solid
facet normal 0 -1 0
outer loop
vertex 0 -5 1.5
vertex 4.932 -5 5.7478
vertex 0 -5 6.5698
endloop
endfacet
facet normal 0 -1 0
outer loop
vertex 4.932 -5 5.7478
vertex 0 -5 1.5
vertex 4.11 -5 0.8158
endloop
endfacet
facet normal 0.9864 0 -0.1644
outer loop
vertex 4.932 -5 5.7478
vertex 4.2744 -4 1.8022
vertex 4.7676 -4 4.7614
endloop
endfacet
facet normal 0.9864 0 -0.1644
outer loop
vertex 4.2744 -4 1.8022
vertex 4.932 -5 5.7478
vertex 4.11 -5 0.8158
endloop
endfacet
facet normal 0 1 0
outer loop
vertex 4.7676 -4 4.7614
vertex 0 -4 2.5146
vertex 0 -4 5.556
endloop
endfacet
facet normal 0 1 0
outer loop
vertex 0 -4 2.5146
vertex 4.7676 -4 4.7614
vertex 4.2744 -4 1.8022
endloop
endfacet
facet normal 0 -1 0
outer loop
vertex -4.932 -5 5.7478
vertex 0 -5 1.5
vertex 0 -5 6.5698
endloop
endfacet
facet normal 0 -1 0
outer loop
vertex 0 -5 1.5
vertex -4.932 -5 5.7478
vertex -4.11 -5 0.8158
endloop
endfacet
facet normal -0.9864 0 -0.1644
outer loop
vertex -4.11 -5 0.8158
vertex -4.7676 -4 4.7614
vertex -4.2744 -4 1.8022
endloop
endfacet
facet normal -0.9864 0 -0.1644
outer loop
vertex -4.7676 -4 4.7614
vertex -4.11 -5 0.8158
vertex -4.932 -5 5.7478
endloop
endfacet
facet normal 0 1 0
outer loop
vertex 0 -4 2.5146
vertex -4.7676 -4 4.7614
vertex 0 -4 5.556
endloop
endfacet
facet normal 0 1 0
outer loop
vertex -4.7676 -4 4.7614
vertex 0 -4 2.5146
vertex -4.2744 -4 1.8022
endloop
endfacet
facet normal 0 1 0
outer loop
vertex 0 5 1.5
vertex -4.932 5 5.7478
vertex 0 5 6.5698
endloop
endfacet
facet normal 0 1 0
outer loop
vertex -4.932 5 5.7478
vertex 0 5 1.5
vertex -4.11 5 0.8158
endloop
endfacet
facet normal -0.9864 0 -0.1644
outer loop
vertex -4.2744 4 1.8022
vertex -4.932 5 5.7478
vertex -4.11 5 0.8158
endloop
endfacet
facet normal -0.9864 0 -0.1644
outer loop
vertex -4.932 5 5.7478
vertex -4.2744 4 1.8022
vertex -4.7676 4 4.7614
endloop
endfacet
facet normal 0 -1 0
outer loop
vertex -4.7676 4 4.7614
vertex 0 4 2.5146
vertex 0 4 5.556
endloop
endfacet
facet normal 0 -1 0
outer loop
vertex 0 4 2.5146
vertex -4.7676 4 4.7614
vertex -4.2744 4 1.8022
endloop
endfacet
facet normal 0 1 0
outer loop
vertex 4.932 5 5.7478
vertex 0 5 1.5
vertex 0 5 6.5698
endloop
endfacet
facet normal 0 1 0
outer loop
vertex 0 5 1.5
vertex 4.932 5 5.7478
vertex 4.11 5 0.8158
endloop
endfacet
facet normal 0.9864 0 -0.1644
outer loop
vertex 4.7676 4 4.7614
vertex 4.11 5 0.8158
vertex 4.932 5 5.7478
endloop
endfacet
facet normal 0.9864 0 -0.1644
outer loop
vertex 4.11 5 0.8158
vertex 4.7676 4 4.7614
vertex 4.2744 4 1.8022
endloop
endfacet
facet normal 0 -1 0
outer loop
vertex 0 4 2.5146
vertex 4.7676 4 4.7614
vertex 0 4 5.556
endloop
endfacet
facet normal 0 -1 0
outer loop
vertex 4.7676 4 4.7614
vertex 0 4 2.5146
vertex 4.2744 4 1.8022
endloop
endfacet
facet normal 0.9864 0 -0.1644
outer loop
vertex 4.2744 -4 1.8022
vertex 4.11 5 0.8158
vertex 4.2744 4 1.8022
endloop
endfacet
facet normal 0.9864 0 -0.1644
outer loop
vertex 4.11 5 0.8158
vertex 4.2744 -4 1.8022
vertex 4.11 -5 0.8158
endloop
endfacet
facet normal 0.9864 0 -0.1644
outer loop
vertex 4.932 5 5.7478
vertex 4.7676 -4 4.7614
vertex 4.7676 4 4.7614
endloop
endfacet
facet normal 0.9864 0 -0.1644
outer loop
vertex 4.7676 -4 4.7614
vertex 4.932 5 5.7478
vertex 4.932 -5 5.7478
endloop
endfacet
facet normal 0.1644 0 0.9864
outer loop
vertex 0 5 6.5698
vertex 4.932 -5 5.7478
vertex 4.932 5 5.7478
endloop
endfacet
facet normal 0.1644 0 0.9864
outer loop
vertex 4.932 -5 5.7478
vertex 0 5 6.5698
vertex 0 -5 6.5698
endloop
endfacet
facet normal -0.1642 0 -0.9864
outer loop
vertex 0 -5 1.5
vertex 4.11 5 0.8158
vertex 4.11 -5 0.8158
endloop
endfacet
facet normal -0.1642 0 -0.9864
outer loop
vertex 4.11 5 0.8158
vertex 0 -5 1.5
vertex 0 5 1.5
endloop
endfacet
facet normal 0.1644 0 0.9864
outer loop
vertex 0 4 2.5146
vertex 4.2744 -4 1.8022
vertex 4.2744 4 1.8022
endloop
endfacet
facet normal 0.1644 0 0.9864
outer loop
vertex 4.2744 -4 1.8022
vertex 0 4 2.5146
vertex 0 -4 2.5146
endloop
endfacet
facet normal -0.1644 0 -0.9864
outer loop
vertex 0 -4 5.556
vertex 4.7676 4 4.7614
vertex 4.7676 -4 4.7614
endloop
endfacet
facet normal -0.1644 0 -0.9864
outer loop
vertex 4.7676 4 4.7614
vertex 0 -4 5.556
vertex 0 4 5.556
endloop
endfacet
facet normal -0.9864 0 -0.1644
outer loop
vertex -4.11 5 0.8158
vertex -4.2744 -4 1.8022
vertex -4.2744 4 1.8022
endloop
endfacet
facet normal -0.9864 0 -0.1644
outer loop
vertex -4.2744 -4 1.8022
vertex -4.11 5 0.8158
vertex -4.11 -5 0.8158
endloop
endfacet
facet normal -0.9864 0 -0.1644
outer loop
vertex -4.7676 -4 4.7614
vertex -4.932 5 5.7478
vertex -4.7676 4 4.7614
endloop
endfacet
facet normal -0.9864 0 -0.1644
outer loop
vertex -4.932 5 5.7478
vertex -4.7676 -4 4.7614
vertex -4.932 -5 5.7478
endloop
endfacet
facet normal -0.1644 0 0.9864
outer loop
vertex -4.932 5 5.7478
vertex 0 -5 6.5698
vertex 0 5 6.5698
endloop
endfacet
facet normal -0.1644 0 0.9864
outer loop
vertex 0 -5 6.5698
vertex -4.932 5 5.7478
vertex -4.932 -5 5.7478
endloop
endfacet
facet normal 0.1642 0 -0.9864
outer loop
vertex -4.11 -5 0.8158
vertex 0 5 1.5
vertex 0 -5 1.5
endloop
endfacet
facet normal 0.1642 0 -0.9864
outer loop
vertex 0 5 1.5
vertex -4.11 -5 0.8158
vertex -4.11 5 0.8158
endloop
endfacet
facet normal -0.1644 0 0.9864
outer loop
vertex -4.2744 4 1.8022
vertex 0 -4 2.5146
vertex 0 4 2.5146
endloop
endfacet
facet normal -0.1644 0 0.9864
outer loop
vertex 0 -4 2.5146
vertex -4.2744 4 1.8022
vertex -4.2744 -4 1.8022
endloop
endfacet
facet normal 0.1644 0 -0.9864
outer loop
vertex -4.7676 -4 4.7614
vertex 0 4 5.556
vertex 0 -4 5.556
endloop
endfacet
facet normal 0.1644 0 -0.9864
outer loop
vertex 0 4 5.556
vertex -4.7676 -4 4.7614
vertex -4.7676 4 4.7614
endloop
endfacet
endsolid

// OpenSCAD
// file: s/u7035s01.scad
use <../../lib.scad>
function ldraw_lib__s__u7035s01() = [
// 0 ~Modulex Angled Brick 9 2 x 1 Double - Side
// 0 Name: s\u7035s01.dat
// 0 Author: Magnus Forsberg [MagFors]
// 0 !LDRAW_ORG Subpart UPDATE 2025-09
// 0 !LICENSE Licensed under CC BY 4.0 : see CAreadme.txt
// 
// 0 BFC CERTIFY CCW
  [0,"BFC","CERTIFY"],
  [0,"BFC","CCW"],
// 
// 0 !HISTORY 2025-09-29 [OrionP] Official Update 2025-09
// 
// 4 16 0 -16.4245 0 0 -3.75 0 10.274942 -2.039593 0 12.329925 -14.369517 0
  [4,16,0,-16.4245,0,0,-3.75,0,10.274942,-2.039593,0,12.329925,-14.369517,0],
// 4 16 10.274942 -2.039593 0 10.685939 -4.505578 2.5 11.918928 -11.903532 2.5 12.329925 -14.369517 0
  [4,16,10.274942,-2.039593,0,10.685939,-4.505578,2.5,11.918928,-11.903532,2.5,12.329925,-14.369517,0],
// 4 16 0 -6.286563 2.5 0 -13.890016 2.5 11.918928 -11.903532 2.5 10.685939 -4.505578 2.5
  [4,16,0,-6.286563,2.5,0,-13.890016,2.5,11.918928,-11.903532,2.5,10.685939,-4.505578,2.5],
// 2 24 10.685939 -4.505578 2.5 11.918928 -11.903532 2.5
  [2,24,10.685939,-4.505578,2.5,11.918928,-11.903532,2.5],
// 2 24 12.329925 -14.369517 0 10.274942 -2.039593 0
  [2,24,12.329925,-14.369517,0,10.274942,-2.039593,0],
// 2 24 10.274942 -2.039593 0 0 -3.75 0
  [2,24,10.274942,-2.039593,0,0,-3.75,0],
// 2 24 0 -6.286563 2.5 10.685939 -4.505578 2.5
  [2,24,0,-6.286563,2.5,10.685939,-4.505578,2.5],
// 2 24 0 -13.890016 2.5 11.918928 -11.903532 2.5
  [2,24,0,-13.890016,2.5,11.918928,-11.903532,2.5],
// 2 24 0 -16.4245 0 12.329925 -14.369517 0
  [2,24,0,-16.4245,0,12.329925,-14.369517,0],
// 4 16 -10.274942 -2.039593 0 0 -3.75 0 0 -16.4245 0 -12.329925 -14.369517 0
  [4,16,-10.274942,-2.039593,0,0,-3.75,0,0,-16.4245,0,-12.329925,-14.369517,0],
// 4 16 -11.918928 -11.903532 2.5 -10.685939 -4.505578 2.5 -10.274942 -2.039593 0 -12.329925 -14.369517 0
  [4,16,-11.918928,-11.903532,2.5,-10.685939,-4.505578,2.5,-10.274942,-2.039593,0,-12.329925,-14.369517,0],
// 4 16 -11.918928 -11.903532 2.5 0 -13.890016 2.5 0 -6.286563 2.5 -10.685939 -4.505578 2.5
  [4,16,-11.918928,-11.903532,2.5,0,-13.890016,2.5,0,-6.286563,2.5,-10.685939,-4.505578,2.5],
// 2 24 -11.918928 -11.903532 2.5 -10.685939 -4.505578 2.5
  [2,24,-11.918928,-11.903532,2.5,-10.685939,-4.505578,2.5],
// 2 24 -10.274942 -2.039593 0 -12.329925 -14.369517 0
  [2,24,-10.274942,-2.039593,0,-12.329925,-14.369517,0],
// 2 24 0 -3.75 0 -10.274942 -2.039593 0
  [2,24,0,-3.75,0,-10.274942,-2.039593,0],
// 2 24 -10.685939 -4.505578 2.5 0 -6.286563 2.5
  [2,24,-10.685939,-4.505578,2.5,0,-6.286563,2.5],
// 2 24 -11.918928 -11.903532 2.5 0 -13.890016 2.5
  [2,24,-11.918928,-11.903532,2.5,0,-13.890016,2.5],
// 2 24 -12.329925 -14.369517 0 0 -16.4245 0
  [2,24,-12.329925,-14.369517,0,0,-16.4245,0],
];
module ldraw_lib__s__u7035s01(step=0, col=false, unit=2/5, alt=false, line=0.2, solid=!$preview)
    makepoly(ldraw_lib__s__u7035s01(), step=step, col=col, unit=unit, alt=alt, line=line, solid=solid);
ldraw_lib__s__u7035s01(line=0.2);
// main file
use <../lib.scad>
use <s/u7035s01.scad>
function ldraw_lib__u7036() = [
// 0 Modulex Brick Angled 9 2 x 2 Double
// 0 Name: u7036.dat
// 0 Author: Magnus Forsberg [MagFors]
// 0 !LDRAW_ORG Part UPDATE 2025-09
// 0 !LICENSE Licensed under CC BY 4.0 : see CAreadme.txt
// 
// 0 !HELP 1 16 25 12.5 0 1 0 0 0 1 0 0 0 1 u7033.dat
// 0 !HELP 1 35 11.302 -8.204 0 0 .986 .164 0 .164 -.986 -1 0 0 u7001.dat
// 
// 0 BFC CERTIFY CCW
  [0,"BFC","CERTIFY"],
  [0,"BFC","CCW"],
// 
// 0 !KEYWORDS 9.4623 degree, Bricklink Mx2406B, Rebrickable 2406B, slope 1:6
// 
// 0 !HISTORY 2025-09-29 [OrionP] Official Update 2025-09
// 
// 1 16 0 0 -12.5 1 0 0 0 1 0 0 0 1 s\u7035s01.dat
  [1,16,0,0,-12.5,1,0,0,0,1,0,0,0,1, ldraw_lib__s__u7035s01()],
// 1 16 0 0 12.5 -1 0 0 0 1 0 0 0 -1 s\u7035s01.dat
  [1,16,0,0,12.5,-1,0,0,0,1,0,0,0,-1, ldraw_lib__s__u7035s01()],
// 
// 2 24 0 -13.890016 10 0 -13.890016 -10
  [2,24,0,-13.890016,10,0,-13.890016,-10],
// 2 24 0 -6.286563 -10 0 -6.286563 10
  [2,24,0,-6.286563,-10,0,-6.286563,10],
// 2 24 0 -16.4245 -12.5 0 -16.4245 12.5
  [2,24,0,-16.4245,-12.5,0,-16.4245,12.5],
// 2 24 0 -3.75 -12.5 0 -3.75 12.5
  [2,24,0,-3.75,-12.5,0,-3.75,12.5],
// 
// 4 16 10.274942 -2.039593 -12.5 10.274942 -2.039593 12.5 10.685939 -4.505578 10 10.685939 -4.505578 -10
  [4,16,10.274942,-2.039593,-12.5,10.274942,-2.039593,12.5,10.685939,-4.505578,10,10.685939,-4.505578,-10],
// 4 16 12.329925 -14.369517 -12.5 11.918928 -11.903532 -10 11.918928 -11.903532 10 12.329925 -14.369517 12.5
  [4,16,12.329925,-14.369517,-12.5,11.918928,-11.903532,-10,11.918928,-11.903532,10,12.329925,-14.369517,12.5],
// 4 16 12.329925 -14.369517 -12.5 12.329925 -14.369517 12.5 0 -16.4245 12.5 0 -16.4245 -12.5
  [4,16,12.329925,-14.369517,-12.5,12.329925,-14.369517,12.5,0,-16.4245,12.5,0,-16.4245,-12.5],
// 4 16 0 -3.75 12.5 10.274942 -2.039593 12.5 10.274942 -2.039593 -12.5 0 -3.75 -12.5
  [4,16,0,-3.75,12.5,10.274942,-2.039593,12.5,10.274942,-2.039593,-12.5,0,-3.75,-12.5],
// 
// 4 16 0 -6.286563 10 0 -6.286563 -10 10.685939 -4.505578 -10 10.685939 -4.505578 10
  [4,16,0,-6.286563,10,0,-6.286563,-10,10.685939,-4.505578,-10,10.685939,-4.505578,10],
// 4 16 0 -13.890016 10 11.918928 -11.903532 10 11.918928 -11.903532 -10 0 -13.890016 -10
  [4,16,0,-13.890016,10,11.918928,-11.903532,10,11.918928,-11.903532,-10,0,-13.890016,-10],
// 
// 2 24 12.329925 -14.369517 -12.5 12.329925 -14.369517 12.5
  [2,24,12.329925,-14.369517,-12.5,12.329925,-14.369517,12.5],
// 2 24 11.918928 -11.903532 -10 11.918928 -11.903532 10
  [2,24,11.918928,-11.903532,-10,11.918928,-11.903532,10],
// 2 24 10.274942 -2.039593 -12.5 10.274942 -2.039593 12.5
  [2,24,10.274942,-2.039593,-12.5,10.274942,-2.039593,12.5],
// 2 24 10.685939 -4.505578 10 10.685939 -4.505578 -10
  [2,24,10.685939,-4.505578,10,10.685939,-4.505578,-10],
// 
// 4 16 -10.685939 -4.505578 10 -10.274942 -2.039593 12.5 -10.274942 -2.039593 -12.5 -10.685939 -4.505578 -10
  [4,16,-10.685939,-4.505578,10,-10.274942,-2.039593,12.5,-10.274942,-2.039593,-12.5,-10.685939,-4.505578,-10],
// 4 16 -11.918928 -11.903532 10 -11.918928 -11.903532 -10 -12.329925 -14.369517 -12.5 -12.329925 -14.369517 12.5
  [4,16,-11.918928,-11.903532,10,-11.918928,-11.903532,-10,-12.329925,-14.369517,-12.5,-12.329925,-14.369517,12.5],
// 4 16 0 -16.4245 12.5 -12.329925 -14.369517 12.5 -12.329925 -14.369517 -12.5 0 -16.4245 -12.5
  [4,16,0,-16.4245,12.5,-12.329925,-14.369517,12.5,-12.329925,-14.369517,-12.5,0,-16.4245,-12.5],
// 4 16 -10.274942 -2.039593 -12.5 -10.274942 -2.039593 12.5 0 -3.75 12.5 0 -3.75 -12.5
  [4,16,-10.274942,-2.039593,-12.5,-10.274942,-2.039593,12.5,0,-3.75,12.5,0,-3.75,-12.5],
// 4 16 -10.685939 -4.505578 -10 0 -6.286563 -10 0 -6.286563 10 -10.685939 -4.505578 10
  [4,16,-10.685939,-4.505578,-10,0,-6.286563,-10,0,-6.286563,10,-10.685939,-4.505578,10],
// 4 16 -11.918928 -11.903532 -10 -11.918928 -11.903532 10 0 -13.890016 10 0 -13.890016 -10
  [4,16,-11.918928,-11.903532,-10,-11.918928,-11.903532,10,0,-13.890016,10,0,-13.890016,-10],
// 2 24 -12.329925 -14.369517 12.5 -12.329925 -14.369517 -12.5
  [2,24,-12.329925,-14.369517,12.5,-12.329925,-14.369517,-12.5],
// 2 24 -11.918928 -11.903532 10 -11.918928 -11.903532 -10
  [2,24,-11.918928,-11.903532,10,-11.918928,-11.903532,-10],
// 2 24 -10.274942 -2.039593 12.5 -10.274942 -2.039593 -12.5
  [2,24,-10.274942,-2.039593,12.5,-10.274942,-2.039593,-12.5],
// 2 24 -10.685939 -4.505578 -10 -10.685939 -4.505578 10
  [2,24,-10.685939,-4.505578,-10,-10.685939,-4.505578,10],
];
module ldraw_lib__u7036(step=0, col=false, unit=2/5, alt=false, line=0.2, solid=!$preview)
    makepoly(ldraw_lib__u7036(), step=step, col=col, unit=unit, alt=alt, line=line, solid=solid);
ldraw_lib__u7036(line=0.2);
